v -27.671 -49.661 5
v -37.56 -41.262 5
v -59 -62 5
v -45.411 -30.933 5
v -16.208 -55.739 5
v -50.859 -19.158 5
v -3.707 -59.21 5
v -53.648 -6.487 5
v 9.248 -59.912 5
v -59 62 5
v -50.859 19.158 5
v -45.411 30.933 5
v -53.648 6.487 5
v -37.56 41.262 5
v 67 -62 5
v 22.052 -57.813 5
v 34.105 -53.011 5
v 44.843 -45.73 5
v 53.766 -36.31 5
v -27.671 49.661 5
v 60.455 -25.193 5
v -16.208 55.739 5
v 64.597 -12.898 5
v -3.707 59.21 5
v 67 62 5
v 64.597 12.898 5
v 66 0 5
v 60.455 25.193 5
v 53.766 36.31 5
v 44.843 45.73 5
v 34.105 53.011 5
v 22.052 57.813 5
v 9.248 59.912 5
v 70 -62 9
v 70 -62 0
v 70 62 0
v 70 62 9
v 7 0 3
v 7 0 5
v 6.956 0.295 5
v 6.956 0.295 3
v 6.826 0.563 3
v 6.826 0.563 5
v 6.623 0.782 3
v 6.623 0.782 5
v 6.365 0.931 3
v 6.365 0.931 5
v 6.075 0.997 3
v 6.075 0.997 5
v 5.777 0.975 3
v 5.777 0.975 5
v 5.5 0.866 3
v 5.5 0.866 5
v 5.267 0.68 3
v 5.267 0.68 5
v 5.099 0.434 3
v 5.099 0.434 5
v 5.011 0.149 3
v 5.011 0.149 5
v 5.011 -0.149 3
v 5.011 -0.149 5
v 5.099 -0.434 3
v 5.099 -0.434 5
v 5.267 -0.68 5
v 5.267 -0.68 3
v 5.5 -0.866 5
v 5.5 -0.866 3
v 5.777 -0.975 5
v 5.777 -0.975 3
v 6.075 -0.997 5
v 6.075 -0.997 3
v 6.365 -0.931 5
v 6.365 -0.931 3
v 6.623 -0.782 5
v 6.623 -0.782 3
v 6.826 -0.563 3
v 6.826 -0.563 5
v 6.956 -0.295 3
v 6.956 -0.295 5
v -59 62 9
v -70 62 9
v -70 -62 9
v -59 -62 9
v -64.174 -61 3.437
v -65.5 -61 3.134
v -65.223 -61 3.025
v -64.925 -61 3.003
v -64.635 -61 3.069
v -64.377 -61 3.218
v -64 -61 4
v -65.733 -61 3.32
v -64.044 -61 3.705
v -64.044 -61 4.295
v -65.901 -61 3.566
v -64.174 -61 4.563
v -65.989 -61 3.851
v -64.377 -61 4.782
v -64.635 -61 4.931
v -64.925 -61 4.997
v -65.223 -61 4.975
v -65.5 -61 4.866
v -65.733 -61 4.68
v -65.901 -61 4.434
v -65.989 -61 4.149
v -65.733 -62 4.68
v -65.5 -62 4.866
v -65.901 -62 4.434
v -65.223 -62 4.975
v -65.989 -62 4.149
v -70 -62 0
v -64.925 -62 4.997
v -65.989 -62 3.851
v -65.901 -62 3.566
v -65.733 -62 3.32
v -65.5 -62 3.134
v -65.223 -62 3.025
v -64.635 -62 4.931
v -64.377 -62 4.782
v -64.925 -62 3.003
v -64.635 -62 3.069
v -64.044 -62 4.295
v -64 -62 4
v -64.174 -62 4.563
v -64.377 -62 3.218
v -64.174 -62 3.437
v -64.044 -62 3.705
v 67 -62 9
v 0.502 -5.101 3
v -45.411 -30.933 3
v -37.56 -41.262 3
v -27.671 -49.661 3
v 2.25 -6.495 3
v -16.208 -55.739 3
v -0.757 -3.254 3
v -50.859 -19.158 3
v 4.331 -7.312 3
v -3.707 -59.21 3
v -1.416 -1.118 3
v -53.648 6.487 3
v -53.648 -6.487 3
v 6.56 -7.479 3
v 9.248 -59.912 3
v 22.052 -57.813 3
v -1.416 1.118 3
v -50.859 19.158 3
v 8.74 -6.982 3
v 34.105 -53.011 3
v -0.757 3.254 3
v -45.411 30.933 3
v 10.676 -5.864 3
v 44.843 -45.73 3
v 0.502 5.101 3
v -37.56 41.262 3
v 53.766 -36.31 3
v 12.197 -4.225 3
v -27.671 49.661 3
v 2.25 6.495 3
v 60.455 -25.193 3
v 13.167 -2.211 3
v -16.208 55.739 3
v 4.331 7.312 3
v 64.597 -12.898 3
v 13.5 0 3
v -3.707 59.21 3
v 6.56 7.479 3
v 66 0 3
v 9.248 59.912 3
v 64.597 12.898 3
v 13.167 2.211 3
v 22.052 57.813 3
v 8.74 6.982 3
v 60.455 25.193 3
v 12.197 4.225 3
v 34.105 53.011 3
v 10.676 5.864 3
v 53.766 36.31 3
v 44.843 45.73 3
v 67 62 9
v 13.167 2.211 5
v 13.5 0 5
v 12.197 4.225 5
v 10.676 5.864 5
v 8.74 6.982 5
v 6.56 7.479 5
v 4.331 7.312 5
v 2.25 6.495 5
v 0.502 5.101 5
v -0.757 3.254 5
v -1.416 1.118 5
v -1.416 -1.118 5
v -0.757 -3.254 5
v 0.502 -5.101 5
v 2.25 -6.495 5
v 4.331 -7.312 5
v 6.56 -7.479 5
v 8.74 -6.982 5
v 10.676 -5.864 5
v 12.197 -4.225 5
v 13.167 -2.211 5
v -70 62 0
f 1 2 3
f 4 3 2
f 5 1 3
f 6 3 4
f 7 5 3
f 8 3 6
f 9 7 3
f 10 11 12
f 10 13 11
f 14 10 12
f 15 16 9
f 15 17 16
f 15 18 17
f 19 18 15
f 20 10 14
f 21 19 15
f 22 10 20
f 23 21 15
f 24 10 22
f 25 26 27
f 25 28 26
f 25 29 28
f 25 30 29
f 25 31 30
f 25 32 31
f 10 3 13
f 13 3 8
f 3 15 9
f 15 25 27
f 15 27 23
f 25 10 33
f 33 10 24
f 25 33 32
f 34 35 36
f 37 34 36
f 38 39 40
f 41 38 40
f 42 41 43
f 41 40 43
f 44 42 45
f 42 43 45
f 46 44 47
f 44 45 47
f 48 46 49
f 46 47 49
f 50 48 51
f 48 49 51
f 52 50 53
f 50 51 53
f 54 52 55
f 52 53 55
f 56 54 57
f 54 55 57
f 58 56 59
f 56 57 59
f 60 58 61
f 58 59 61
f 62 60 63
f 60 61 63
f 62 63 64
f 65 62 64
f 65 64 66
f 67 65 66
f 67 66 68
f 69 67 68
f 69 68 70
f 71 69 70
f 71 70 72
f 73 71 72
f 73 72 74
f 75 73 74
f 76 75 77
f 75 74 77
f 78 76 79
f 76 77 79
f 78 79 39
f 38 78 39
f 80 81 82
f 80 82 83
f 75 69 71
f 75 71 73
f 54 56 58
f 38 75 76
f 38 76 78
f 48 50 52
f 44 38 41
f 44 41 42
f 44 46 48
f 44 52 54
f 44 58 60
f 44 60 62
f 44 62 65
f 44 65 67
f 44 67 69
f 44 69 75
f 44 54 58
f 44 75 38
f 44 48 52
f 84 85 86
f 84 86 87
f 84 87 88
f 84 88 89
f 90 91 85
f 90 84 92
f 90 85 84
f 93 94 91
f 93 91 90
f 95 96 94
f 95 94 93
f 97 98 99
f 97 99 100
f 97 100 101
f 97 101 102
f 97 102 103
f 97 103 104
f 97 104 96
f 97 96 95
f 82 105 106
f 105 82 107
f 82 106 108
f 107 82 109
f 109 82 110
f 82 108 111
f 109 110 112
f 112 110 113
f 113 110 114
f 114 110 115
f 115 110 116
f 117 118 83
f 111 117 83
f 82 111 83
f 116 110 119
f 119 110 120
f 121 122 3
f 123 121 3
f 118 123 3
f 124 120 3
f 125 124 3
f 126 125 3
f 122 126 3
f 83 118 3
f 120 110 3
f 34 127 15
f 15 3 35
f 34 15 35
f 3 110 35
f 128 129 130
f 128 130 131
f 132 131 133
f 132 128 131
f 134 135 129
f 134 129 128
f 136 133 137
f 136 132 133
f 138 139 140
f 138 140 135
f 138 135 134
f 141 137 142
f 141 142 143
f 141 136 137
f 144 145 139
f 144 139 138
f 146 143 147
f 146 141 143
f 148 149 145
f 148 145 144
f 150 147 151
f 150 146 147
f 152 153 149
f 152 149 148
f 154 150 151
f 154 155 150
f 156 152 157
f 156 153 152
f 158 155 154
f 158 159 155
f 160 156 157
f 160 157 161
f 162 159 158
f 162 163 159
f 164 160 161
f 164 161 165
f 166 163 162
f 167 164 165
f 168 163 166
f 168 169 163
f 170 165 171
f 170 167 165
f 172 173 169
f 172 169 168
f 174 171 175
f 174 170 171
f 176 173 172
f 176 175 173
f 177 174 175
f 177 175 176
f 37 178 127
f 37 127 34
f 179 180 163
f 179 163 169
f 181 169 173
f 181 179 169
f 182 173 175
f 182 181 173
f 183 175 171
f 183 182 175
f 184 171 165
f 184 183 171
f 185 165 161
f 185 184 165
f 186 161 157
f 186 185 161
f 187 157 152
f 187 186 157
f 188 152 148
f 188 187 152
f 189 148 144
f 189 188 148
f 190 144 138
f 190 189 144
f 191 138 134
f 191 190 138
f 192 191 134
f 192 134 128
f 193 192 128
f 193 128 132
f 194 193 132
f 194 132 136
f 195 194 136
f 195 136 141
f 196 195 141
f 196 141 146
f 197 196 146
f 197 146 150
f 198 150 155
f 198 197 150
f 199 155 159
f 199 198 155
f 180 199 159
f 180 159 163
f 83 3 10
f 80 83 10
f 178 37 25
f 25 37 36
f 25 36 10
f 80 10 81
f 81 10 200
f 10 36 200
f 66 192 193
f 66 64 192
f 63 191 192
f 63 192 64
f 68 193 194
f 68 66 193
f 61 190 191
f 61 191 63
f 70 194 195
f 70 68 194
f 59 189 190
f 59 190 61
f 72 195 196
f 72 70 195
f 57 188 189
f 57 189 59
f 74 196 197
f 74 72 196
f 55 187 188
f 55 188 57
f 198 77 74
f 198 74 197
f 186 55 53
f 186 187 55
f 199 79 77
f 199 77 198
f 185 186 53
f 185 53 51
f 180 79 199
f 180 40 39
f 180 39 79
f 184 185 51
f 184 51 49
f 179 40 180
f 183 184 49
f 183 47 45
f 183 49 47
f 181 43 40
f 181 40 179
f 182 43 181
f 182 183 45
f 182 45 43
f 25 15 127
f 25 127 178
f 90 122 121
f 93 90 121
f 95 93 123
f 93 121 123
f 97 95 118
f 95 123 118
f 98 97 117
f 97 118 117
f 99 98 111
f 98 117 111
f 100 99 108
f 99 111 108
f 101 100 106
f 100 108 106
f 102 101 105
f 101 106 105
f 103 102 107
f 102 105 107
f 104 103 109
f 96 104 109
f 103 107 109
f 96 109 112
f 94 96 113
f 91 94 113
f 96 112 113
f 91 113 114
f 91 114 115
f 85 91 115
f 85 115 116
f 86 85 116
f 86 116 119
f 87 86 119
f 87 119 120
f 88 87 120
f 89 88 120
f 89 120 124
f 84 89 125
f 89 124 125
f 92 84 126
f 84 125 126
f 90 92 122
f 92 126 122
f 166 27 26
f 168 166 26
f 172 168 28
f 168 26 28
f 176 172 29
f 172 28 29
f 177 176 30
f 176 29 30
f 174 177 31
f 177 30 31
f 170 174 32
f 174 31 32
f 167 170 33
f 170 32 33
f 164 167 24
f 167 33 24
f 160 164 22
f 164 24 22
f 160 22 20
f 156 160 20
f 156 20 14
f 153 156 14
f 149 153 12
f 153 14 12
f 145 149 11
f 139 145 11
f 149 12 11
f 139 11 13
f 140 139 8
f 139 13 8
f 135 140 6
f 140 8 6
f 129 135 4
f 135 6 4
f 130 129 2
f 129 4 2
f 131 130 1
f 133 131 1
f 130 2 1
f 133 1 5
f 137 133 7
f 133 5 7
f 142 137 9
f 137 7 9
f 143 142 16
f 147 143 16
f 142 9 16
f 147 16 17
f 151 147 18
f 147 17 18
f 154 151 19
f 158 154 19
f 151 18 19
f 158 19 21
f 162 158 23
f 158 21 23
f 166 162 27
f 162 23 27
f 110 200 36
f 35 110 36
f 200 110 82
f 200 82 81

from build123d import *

# Parameters (mm, degrees)
F0_W     = 126
F0_H     = 124
F0_W_2   = 11
F0_W_3   = 3
F1_DEPTH = 5
F2_DEPTH = 9
F3_R     = 60
F3_R_2   = 7.5
F4_DEPTH = 2
F5_R     = 1
F6_DEPTH = 2
F7_R     = 1
F8_DEPTH = 1


# Not quite as in the source:
# - a feature names something its author has since deleted; it is built from what else it names


with BuildPart() as f1:
    # F0 (on Top) → F1 (new body)
    with BuildSketch(Plane.XY):
        with Locations((4, 0)):
            Rectangle(F0_W, F0_H)
        with Locations((-64.5, 0)):
            Rectangle(F0_W_2, F0_H)
        with Locations((68.5, 0)):
            Rectangle(F0_W_3, F0_H)
    extrude(amount=F1_DEPTH)

    # F0 (on Top) → F2 (join)
    with BuildSketch(Plane.XY):
        with Locations((-64.5, 0)):
            Rectangle(F0_W_2, F0_H)
        with Locations((68.5, 0)):
            Rectangle(F0_W_3, F0_H)
    extrude(amount=F2_DEPTH)

    # F3 (on face) → F4 (cut)
    with BuildSketch(Plane.XY.offset(5)):
        with Locations((6.0000000522, 0)):
            Circle(F3_R)
        with Locations((6.0000000522, 0)):
            Circle(F3_R_2, mode=Mode.SUBTRACT)
    extrude(amount=-F4_DEPTH, mode=Mode.SUBTRACT)

    # F5 (on face) → F6 (cut)
    with BuildSketch(Plane.XY.offset(5)):
        with Locations((6.0000000522, 0)):
            Circle(F5_R)
    extrude(amount=-F6_DEPTH, mode=Mode.SUBTRACT)

    # F7 (on face) → F8 (cut)
    with BuildSketch(Plane.XZ.offset(62)):
        with Locations((-64.9999976158, 4)):
            Circle(F7_R)
    extrude(amount=-F8_DEPTH, mode=Mode.SUBTRACT)


solid = f1.part
